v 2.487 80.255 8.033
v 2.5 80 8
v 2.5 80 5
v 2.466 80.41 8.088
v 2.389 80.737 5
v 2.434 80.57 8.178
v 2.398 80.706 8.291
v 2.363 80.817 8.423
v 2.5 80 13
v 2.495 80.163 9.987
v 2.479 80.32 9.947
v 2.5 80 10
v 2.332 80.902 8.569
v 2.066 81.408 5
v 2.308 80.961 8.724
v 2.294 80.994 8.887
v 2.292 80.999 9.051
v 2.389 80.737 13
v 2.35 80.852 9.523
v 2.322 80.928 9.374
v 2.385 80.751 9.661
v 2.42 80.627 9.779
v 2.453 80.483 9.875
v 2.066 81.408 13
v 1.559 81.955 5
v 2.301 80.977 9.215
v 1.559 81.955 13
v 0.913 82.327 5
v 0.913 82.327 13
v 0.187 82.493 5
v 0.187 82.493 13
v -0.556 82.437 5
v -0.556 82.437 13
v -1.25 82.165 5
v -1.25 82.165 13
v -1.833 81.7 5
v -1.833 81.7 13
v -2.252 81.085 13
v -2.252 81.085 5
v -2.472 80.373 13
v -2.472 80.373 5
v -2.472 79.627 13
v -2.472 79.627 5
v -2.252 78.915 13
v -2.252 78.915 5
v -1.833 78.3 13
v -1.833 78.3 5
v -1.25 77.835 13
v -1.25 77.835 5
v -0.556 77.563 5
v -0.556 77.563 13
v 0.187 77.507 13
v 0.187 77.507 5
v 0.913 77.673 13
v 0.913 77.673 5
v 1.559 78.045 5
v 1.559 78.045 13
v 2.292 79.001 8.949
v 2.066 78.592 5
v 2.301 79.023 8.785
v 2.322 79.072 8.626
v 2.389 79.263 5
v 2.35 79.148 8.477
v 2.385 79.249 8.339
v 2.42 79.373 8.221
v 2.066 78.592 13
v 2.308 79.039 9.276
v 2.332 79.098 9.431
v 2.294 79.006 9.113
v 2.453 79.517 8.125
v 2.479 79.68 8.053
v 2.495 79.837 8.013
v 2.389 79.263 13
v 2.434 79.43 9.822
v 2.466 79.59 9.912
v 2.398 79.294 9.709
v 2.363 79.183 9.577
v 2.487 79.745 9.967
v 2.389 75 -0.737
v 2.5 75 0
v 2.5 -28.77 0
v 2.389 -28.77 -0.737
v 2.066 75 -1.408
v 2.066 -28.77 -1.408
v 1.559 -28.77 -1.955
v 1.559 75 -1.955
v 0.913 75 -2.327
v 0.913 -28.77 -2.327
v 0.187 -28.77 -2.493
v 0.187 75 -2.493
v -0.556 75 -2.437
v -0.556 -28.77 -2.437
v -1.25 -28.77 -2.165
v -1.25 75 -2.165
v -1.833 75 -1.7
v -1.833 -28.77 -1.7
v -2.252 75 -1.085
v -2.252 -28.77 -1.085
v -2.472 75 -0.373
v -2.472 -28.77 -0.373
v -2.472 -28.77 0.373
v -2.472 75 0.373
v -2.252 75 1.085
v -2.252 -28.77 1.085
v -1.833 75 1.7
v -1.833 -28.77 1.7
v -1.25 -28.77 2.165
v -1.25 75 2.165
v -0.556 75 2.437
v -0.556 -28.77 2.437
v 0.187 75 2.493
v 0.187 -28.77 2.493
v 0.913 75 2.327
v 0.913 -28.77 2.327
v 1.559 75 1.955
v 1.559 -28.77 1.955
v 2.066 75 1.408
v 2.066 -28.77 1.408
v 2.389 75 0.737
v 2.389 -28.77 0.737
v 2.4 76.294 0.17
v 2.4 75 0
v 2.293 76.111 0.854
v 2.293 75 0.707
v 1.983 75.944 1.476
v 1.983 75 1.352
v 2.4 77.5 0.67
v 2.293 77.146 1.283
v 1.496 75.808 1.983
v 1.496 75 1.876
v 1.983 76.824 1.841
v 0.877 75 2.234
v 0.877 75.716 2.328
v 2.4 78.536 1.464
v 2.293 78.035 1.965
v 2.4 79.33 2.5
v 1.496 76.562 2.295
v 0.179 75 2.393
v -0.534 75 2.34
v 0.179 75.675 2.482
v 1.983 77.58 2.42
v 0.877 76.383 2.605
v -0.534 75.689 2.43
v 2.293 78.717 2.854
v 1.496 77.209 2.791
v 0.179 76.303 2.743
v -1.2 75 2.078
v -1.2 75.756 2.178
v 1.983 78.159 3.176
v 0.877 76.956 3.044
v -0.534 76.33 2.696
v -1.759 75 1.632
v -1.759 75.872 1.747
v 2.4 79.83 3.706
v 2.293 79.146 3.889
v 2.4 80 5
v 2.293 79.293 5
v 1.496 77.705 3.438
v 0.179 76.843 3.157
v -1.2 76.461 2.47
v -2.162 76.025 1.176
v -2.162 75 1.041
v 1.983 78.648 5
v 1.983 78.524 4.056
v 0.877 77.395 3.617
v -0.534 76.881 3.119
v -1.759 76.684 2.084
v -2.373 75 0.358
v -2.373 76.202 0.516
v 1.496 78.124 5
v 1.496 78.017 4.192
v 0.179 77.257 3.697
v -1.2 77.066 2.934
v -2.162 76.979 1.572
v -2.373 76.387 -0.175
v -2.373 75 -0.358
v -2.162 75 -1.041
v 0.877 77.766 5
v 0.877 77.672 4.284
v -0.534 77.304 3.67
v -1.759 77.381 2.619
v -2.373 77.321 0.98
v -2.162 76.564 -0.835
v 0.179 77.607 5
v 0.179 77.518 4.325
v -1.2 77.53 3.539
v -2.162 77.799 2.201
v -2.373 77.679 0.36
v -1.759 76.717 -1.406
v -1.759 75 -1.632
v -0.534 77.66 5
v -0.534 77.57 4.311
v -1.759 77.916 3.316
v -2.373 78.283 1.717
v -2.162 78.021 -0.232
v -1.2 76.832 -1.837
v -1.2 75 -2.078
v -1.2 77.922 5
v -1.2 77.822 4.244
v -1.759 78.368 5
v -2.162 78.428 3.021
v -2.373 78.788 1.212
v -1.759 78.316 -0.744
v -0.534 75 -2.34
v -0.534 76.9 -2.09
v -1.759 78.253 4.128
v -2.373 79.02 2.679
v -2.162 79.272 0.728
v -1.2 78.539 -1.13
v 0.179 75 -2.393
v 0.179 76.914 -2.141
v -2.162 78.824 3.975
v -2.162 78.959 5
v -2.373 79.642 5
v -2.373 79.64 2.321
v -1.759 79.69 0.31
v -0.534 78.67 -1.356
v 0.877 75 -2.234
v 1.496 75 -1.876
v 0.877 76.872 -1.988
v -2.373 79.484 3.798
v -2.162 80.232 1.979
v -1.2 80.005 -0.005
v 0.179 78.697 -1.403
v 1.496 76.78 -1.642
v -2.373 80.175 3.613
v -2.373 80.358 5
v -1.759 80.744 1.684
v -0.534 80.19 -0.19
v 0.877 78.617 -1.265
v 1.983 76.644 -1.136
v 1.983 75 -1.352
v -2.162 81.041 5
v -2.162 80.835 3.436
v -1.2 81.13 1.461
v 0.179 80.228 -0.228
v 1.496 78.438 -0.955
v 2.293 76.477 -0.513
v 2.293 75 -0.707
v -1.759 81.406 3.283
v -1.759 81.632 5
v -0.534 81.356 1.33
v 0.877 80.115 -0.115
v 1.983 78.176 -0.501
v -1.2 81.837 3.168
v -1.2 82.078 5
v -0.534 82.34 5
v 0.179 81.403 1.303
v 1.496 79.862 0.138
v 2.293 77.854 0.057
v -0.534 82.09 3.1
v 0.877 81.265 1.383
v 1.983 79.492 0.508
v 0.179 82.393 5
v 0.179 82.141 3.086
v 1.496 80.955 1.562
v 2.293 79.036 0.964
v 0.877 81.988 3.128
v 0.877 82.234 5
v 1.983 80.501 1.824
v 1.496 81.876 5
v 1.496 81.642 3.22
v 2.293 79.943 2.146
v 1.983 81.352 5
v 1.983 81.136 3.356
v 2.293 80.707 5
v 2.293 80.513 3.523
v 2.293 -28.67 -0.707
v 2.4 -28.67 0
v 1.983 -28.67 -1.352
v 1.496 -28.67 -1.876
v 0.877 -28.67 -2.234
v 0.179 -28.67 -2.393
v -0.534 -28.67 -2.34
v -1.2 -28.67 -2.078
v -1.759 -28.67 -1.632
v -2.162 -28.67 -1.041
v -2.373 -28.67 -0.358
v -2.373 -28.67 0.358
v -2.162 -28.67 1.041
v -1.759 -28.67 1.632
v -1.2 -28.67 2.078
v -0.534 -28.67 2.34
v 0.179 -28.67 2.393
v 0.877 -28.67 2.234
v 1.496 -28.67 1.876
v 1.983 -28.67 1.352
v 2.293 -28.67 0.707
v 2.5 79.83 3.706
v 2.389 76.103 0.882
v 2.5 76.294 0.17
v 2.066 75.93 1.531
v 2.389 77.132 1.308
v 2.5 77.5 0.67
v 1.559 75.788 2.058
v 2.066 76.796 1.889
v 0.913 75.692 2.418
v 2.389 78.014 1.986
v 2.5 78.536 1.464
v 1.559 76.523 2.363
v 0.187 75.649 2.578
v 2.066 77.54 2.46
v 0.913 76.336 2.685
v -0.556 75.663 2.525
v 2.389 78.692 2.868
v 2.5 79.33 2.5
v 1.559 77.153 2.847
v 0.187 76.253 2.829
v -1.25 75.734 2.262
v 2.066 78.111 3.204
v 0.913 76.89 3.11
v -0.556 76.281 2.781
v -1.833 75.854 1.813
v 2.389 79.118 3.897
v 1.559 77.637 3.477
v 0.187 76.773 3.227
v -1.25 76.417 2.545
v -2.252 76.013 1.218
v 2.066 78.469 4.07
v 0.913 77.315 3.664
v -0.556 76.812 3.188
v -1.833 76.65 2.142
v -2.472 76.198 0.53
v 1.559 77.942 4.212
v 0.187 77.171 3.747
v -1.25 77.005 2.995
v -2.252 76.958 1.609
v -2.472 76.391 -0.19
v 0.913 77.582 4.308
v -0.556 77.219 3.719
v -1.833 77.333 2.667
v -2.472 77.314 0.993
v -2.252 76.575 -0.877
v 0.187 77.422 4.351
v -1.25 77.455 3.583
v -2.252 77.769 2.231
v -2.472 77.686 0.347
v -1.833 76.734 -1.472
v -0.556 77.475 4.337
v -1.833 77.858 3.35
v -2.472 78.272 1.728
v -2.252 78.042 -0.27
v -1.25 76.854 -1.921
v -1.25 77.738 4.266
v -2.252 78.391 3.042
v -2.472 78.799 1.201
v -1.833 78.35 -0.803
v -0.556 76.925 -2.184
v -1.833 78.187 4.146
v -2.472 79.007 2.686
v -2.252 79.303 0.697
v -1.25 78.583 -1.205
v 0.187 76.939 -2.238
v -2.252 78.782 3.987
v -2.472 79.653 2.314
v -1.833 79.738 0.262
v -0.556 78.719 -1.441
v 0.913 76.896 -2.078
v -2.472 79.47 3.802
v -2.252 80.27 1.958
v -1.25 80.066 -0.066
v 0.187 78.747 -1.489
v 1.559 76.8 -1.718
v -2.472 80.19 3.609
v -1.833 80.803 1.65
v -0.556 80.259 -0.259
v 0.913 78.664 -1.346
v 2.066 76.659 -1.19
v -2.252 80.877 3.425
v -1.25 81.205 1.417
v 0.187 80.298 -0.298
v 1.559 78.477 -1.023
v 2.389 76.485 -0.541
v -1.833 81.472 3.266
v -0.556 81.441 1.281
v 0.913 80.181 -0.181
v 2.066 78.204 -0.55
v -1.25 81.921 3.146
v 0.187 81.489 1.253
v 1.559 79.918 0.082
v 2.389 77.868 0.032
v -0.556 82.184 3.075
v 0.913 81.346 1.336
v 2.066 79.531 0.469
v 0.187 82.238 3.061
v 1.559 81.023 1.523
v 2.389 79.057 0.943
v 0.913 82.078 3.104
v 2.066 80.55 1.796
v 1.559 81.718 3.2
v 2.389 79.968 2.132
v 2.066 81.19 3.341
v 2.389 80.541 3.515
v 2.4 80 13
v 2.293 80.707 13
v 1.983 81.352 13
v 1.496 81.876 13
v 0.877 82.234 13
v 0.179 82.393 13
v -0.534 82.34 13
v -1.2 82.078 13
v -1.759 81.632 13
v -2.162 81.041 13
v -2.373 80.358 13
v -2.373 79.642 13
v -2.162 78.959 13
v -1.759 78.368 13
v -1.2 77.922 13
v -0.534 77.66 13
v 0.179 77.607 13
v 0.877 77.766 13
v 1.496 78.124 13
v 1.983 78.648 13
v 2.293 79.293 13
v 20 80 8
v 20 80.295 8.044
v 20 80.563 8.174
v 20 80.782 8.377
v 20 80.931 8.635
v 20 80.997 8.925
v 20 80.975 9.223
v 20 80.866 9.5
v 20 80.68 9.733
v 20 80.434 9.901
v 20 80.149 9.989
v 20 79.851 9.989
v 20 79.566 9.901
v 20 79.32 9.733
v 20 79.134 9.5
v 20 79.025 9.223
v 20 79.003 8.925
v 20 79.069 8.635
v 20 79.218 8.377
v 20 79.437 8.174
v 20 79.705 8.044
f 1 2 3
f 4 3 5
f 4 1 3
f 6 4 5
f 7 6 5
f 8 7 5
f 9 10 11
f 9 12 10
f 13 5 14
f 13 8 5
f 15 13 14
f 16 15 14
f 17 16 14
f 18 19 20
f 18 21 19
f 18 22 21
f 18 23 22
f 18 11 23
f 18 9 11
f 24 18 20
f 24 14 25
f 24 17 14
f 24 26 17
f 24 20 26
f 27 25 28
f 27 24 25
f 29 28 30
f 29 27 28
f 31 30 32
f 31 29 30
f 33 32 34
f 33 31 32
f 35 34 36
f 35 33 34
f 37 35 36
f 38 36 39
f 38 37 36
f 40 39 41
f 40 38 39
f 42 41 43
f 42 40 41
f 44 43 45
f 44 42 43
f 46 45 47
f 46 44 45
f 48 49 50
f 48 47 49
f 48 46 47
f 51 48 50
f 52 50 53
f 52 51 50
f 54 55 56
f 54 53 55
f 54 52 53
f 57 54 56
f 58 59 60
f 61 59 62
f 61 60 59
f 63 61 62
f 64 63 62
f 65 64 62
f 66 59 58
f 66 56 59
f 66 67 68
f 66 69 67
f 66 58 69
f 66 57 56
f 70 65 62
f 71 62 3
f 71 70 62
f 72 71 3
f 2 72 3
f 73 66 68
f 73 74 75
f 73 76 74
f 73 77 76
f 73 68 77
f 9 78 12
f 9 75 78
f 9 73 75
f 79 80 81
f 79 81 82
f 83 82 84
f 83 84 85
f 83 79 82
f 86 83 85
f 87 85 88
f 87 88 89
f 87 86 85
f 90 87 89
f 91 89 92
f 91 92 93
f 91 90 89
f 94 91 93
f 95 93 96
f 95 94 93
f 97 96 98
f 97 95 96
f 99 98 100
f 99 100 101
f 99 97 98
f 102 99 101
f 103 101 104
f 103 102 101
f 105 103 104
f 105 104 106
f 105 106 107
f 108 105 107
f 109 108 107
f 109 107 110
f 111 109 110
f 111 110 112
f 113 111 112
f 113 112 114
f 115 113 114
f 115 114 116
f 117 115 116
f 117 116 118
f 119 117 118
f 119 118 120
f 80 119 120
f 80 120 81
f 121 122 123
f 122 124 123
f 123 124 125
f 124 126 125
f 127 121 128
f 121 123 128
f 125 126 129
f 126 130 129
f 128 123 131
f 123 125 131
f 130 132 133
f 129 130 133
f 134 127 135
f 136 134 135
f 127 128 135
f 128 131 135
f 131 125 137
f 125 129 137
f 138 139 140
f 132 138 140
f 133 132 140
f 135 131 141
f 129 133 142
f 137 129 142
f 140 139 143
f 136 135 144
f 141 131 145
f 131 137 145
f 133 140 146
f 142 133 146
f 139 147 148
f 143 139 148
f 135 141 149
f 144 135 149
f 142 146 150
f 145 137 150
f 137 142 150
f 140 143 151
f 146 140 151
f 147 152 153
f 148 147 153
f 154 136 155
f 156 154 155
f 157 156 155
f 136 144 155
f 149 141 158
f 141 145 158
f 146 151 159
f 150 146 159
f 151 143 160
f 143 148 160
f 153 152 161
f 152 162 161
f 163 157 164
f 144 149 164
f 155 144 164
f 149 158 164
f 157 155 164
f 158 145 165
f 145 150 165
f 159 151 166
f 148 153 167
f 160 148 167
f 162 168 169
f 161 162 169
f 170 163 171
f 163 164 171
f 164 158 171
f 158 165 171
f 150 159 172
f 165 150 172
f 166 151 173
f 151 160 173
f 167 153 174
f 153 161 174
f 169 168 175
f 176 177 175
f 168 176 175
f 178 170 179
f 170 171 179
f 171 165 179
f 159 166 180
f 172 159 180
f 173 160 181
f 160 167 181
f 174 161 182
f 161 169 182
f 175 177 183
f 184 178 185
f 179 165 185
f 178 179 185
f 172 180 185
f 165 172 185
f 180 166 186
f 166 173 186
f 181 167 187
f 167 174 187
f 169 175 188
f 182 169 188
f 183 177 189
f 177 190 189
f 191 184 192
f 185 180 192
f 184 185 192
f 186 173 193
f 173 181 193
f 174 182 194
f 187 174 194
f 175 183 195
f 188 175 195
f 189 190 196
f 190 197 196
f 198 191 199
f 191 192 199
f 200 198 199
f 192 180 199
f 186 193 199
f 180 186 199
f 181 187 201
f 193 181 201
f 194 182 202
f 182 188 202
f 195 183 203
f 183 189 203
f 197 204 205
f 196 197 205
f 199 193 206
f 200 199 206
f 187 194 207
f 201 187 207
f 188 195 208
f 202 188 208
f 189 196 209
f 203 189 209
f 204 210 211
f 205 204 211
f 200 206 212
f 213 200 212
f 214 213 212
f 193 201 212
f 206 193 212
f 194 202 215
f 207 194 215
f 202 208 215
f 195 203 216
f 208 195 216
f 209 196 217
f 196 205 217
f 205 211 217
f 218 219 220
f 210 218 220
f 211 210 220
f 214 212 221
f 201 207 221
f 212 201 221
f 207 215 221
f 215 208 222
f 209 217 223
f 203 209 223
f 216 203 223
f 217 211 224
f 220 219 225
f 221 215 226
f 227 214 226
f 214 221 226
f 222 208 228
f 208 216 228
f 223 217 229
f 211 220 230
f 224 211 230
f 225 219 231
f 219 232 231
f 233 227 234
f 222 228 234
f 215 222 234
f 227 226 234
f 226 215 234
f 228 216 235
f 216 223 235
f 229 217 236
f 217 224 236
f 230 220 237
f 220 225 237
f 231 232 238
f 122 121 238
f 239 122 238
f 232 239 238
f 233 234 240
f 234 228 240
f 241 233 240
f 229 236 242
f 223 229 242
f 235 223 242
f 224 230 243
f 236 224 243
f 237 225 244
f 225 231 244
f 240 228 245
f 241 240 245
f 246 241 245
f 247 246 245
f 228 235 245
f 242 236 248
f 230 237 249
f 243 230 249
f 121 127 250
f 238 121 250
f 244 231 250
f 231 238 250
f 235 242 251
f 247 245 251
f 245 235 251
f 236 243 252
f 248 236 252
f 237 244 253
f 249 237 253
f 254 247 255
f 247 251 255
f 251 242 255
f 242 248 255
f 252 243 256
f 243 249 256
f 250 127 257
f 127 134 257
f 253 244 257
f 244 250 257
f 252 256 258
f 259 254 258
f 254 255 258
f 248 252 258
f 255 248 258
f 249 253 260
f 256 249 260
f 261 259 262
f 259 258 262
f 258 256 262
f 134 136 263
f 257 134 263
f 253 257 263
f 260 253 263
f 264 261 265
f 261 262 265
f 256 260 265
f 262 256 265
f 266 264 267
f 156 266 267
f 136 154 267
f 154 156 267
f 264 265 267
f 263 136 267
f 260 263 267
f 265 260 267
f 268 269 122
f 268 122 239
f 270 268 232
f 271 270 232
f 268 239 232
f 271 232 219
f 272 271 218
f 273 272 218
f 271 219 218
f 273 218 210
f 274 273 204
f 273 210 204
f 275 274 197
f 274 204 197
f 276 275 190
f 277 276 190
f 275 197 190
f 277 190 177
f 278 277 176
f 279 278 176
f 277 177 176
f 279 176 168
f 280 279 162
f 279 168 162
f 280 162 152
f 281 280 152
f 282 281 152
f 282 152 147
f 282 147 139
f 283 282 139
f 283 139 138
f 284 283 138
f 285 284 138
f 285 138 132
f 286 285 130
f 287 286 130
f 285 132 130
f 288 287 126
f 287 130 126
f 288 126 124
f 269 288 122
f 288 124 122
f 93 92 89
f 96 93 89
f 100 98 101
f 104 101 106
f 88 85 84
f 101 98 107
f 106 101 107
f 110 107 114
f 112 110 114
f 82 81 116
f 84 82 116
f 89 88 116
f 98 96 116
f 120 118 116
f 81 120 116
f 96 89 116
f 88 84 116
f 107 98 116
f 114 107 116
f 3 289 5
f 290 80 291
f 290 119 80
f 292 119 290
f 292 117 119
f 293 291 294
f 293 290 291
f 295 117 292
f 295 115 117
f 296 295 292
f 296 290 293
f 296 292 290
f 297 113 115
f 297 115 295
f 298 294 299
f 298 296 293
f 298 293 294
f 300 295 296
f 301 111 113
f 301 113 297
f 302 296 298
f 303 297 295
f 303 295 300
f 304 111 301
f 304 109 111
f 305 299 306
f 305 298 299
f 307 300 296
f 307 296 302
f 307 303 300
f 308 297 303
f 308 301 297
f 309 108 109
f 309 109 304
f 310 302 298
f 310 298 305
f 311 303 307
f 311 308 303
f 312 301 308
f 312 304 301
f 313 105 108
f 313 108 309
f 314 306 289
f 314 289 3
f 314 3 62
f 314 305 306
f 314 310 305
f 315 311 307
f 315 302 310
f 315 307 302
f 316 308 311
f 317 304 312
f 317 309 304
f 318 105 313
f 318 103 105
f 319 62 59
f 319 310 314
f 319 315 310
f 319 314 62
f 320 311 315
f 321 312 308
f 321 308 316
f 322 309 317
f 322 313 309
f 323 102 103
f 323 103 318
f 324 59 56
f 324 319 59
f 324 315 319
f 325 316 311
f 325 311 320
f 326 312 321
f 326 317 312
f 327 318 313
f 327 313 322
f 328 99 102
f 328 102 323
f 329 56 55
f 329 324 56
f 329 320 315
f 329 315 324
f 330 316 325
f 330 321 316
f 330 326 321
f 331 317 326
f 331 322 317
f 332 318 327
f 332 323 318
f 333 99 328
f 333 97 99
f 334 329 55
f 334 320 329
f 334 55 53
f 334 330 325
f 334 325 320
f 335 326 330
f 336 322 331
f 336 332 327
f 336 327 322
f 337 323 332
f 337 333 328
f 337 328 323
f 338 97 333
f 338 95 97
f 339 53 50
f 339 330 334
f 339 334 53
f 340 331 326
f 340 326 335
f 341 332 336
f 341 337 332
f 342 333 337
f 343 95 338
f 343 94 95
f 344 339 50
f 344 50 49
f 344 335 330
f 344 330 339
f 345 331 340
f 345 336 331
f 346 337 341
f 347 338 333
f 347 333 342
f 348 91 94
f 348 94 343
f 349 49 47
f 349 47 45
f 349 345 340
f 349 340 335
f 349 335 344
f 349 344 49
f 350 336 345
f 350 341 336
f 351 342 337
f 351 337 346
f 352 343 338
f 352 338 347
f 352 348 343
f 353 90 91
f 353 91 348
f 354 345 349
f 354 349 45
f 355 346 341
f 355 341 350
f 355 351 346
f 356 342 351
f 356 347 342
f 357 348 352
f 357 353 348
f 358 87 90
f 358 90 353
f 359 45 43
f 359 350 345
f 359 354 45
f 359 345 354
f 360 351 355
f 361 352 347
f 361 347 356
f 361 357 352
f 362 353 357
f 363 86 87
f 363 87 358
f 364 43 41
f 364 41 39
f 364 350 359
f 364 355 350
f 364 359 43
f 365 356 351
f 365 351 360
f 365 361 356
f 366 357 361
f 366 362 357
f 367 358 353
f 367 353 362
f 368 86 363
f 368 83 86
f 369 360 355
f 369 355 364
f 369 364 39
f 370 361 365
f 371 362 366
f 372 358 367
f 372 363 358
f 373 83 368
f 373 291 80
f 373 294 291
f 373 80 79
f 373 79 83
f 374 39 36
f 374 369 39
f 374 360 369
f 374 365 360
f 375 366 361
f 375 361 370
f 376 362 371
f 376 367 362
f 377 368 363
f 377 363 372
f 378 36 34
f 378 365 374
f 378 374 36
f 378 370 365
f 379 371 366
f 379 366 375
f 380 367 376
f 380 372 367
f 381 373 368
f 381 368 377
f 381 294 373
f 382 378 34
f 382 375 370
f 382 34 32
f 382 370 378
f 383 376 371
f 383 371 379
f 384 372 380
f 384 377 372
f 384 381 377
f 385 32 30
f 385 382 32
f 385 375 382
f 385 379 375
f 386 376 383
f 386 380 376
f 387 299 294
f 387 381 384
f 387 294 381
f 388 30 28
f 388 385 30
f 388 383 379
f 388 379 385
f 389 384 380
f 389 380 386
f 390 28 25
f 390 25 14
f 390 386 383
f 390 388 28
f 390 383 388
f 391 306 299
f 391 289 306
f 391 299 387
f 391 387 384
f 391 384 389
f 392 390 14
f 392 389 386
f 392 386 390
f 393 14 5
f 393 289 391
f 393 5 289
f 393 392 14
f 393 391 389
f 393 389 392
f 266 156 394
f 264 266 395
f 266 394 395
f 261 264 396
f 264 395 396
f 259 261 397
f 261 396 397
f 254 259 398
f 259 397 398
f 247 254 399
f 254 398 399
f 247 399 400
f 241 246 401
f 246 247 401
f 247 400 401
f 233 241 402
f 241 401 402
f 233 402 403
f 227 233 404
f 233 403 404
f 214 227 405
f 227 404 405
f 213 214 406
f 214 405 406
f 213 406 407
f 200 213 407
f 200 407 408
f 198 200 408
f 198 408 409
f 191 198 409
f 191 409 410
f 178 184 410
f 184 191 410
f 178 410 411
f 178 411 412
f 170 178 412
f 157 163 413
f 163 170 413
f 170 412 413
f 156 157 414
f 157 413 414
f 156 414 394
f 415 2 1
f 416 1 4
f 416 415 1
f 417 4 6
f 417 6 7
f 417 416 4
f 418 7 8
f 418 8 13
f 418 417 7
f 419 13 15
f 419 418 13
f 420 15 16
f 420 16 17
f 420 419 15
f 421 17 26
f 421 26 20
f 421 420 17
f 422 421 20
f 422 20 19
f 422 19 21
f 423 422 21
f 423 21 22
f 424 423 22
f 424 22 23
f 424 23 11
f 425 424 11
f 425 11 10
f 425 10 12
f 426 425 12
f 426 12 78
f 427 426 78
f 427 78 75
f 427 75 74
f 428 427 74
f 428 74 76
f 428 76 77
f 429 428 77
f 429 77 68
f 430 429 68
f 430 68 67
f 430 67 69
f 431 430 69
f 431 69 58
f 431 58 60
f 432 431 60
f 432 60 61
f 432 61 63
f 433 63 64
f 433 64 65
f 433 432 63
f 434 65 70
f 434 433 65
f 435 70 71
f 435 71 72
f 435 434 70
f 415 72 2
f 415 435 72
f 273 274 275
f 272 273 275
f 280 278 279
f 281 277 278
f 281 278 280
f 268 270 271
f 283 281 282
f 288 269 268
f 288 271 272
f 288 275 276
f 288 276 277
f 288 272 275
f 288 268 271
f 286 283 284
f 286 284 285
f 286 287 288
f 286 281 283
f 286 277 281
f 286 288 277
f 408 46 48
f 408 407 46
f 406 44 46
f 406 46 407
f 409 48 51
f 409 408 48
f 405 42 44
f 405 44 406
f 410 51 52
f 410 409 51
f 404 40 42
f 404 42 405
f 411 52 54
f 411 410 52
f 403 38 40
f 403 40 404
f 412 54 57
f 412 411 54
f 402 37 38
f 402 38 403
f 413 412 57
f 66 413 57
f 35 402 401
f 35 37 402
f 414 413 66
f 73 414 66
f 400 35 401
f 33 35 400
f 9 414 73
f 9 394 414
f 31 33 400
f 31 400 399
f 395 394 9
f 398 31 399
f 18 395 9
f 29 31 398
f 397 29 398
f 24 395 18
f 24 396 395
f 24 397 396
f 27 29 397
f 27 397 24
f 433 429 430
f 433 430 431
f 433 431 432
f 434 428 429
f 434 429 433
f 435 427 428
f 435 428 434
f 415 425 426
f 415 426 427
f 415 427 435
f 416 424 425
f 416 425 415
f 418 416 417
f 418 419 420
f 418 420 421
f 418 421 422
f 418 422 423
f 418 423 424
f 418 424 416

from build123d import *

# Parameters (mm, degrees)
IZIM2_R                          = 2.5
BO_ALTMA3_T                      = -0.1
Y_KSEKLIK_EKSTR_ZYON2_REACH      = 88.496
Y_KSEKLIK_EKSTR_ZYON2_END_RADIUS = 2.5
IZIM4_R                          = 1


with BuildPart() as part:
    # Süpür1: sweep along a path in Çizim1
    with BuildLine(Plane(origin=(0, 0, 0), x_dir=(0, 0, -1), z_dir=(1, 0, 0))) as s_p_r1_path:
        Line((0, -28.77), (0, 75))
        ThreePointArc((0, 75), (-1.464466094, 78.535533906), (-5, 80))
        Line((-5, 80), (-13, 80))
    # Çizim2 → Süpür1 (sweep)
    with BuildSketch(Plane.XY.offset(13)):
        with Locations((0, 80)):
            Circle(IZIM2_R)
    sweep(path=s_p_r1_path.line)

    # İç Boşaltma3
    bo_altma3_openings = [part.faces().sort_by_distance(p)[0] for p in [
        (0, 80, 13),
    ]]
    offset(amount=BO_ALTMA3_T, openings=bo_altma3_openings, kind=Kind.INTERSECTION)

    # Yükseklik-Ekstrüzyon2: up to this cylinder (the profile starts outside it)
    y_kseklik_ekstr_zyon2_end = Plane(origin=(0, 80, 9), z_dir=(0, 0, 1)) * Cylinder(Y_KSEKLIK_EKSTR_ZYON2_END_RADIUS, 182.992, mode=Mode.PRIVATE)
    # Çizim4 → Yükseklik-Ekstrüzyon2 (add, up to the surface)
    with BuildSketch(Plane(origin=(20, 0, 0), x_dir=(0, 0, -1), z_dir=(1, 0, 0)), mode=Mode.PRIVATE) as y_kseklik_ekstr_zyon2_sk1:
        with Locations((-9, 80)):
            Circle(IZIM4_R)
    y_kseklik_ekstr_zyon2_tool1 = extrude(y_kseklik_ekstr_zyon2_sk1.sketch, amount=-Y_KSEKLIK_EKSTR_ZYON2_REACH, mode=Mode.PRIVATE) - y_kseklik_ekstr_zyon2_end
    add(y_kseklik_ekstr_zyon2_tool1.solids().sort_by_distance((20, 80, 9))[0])


solid = part.part
